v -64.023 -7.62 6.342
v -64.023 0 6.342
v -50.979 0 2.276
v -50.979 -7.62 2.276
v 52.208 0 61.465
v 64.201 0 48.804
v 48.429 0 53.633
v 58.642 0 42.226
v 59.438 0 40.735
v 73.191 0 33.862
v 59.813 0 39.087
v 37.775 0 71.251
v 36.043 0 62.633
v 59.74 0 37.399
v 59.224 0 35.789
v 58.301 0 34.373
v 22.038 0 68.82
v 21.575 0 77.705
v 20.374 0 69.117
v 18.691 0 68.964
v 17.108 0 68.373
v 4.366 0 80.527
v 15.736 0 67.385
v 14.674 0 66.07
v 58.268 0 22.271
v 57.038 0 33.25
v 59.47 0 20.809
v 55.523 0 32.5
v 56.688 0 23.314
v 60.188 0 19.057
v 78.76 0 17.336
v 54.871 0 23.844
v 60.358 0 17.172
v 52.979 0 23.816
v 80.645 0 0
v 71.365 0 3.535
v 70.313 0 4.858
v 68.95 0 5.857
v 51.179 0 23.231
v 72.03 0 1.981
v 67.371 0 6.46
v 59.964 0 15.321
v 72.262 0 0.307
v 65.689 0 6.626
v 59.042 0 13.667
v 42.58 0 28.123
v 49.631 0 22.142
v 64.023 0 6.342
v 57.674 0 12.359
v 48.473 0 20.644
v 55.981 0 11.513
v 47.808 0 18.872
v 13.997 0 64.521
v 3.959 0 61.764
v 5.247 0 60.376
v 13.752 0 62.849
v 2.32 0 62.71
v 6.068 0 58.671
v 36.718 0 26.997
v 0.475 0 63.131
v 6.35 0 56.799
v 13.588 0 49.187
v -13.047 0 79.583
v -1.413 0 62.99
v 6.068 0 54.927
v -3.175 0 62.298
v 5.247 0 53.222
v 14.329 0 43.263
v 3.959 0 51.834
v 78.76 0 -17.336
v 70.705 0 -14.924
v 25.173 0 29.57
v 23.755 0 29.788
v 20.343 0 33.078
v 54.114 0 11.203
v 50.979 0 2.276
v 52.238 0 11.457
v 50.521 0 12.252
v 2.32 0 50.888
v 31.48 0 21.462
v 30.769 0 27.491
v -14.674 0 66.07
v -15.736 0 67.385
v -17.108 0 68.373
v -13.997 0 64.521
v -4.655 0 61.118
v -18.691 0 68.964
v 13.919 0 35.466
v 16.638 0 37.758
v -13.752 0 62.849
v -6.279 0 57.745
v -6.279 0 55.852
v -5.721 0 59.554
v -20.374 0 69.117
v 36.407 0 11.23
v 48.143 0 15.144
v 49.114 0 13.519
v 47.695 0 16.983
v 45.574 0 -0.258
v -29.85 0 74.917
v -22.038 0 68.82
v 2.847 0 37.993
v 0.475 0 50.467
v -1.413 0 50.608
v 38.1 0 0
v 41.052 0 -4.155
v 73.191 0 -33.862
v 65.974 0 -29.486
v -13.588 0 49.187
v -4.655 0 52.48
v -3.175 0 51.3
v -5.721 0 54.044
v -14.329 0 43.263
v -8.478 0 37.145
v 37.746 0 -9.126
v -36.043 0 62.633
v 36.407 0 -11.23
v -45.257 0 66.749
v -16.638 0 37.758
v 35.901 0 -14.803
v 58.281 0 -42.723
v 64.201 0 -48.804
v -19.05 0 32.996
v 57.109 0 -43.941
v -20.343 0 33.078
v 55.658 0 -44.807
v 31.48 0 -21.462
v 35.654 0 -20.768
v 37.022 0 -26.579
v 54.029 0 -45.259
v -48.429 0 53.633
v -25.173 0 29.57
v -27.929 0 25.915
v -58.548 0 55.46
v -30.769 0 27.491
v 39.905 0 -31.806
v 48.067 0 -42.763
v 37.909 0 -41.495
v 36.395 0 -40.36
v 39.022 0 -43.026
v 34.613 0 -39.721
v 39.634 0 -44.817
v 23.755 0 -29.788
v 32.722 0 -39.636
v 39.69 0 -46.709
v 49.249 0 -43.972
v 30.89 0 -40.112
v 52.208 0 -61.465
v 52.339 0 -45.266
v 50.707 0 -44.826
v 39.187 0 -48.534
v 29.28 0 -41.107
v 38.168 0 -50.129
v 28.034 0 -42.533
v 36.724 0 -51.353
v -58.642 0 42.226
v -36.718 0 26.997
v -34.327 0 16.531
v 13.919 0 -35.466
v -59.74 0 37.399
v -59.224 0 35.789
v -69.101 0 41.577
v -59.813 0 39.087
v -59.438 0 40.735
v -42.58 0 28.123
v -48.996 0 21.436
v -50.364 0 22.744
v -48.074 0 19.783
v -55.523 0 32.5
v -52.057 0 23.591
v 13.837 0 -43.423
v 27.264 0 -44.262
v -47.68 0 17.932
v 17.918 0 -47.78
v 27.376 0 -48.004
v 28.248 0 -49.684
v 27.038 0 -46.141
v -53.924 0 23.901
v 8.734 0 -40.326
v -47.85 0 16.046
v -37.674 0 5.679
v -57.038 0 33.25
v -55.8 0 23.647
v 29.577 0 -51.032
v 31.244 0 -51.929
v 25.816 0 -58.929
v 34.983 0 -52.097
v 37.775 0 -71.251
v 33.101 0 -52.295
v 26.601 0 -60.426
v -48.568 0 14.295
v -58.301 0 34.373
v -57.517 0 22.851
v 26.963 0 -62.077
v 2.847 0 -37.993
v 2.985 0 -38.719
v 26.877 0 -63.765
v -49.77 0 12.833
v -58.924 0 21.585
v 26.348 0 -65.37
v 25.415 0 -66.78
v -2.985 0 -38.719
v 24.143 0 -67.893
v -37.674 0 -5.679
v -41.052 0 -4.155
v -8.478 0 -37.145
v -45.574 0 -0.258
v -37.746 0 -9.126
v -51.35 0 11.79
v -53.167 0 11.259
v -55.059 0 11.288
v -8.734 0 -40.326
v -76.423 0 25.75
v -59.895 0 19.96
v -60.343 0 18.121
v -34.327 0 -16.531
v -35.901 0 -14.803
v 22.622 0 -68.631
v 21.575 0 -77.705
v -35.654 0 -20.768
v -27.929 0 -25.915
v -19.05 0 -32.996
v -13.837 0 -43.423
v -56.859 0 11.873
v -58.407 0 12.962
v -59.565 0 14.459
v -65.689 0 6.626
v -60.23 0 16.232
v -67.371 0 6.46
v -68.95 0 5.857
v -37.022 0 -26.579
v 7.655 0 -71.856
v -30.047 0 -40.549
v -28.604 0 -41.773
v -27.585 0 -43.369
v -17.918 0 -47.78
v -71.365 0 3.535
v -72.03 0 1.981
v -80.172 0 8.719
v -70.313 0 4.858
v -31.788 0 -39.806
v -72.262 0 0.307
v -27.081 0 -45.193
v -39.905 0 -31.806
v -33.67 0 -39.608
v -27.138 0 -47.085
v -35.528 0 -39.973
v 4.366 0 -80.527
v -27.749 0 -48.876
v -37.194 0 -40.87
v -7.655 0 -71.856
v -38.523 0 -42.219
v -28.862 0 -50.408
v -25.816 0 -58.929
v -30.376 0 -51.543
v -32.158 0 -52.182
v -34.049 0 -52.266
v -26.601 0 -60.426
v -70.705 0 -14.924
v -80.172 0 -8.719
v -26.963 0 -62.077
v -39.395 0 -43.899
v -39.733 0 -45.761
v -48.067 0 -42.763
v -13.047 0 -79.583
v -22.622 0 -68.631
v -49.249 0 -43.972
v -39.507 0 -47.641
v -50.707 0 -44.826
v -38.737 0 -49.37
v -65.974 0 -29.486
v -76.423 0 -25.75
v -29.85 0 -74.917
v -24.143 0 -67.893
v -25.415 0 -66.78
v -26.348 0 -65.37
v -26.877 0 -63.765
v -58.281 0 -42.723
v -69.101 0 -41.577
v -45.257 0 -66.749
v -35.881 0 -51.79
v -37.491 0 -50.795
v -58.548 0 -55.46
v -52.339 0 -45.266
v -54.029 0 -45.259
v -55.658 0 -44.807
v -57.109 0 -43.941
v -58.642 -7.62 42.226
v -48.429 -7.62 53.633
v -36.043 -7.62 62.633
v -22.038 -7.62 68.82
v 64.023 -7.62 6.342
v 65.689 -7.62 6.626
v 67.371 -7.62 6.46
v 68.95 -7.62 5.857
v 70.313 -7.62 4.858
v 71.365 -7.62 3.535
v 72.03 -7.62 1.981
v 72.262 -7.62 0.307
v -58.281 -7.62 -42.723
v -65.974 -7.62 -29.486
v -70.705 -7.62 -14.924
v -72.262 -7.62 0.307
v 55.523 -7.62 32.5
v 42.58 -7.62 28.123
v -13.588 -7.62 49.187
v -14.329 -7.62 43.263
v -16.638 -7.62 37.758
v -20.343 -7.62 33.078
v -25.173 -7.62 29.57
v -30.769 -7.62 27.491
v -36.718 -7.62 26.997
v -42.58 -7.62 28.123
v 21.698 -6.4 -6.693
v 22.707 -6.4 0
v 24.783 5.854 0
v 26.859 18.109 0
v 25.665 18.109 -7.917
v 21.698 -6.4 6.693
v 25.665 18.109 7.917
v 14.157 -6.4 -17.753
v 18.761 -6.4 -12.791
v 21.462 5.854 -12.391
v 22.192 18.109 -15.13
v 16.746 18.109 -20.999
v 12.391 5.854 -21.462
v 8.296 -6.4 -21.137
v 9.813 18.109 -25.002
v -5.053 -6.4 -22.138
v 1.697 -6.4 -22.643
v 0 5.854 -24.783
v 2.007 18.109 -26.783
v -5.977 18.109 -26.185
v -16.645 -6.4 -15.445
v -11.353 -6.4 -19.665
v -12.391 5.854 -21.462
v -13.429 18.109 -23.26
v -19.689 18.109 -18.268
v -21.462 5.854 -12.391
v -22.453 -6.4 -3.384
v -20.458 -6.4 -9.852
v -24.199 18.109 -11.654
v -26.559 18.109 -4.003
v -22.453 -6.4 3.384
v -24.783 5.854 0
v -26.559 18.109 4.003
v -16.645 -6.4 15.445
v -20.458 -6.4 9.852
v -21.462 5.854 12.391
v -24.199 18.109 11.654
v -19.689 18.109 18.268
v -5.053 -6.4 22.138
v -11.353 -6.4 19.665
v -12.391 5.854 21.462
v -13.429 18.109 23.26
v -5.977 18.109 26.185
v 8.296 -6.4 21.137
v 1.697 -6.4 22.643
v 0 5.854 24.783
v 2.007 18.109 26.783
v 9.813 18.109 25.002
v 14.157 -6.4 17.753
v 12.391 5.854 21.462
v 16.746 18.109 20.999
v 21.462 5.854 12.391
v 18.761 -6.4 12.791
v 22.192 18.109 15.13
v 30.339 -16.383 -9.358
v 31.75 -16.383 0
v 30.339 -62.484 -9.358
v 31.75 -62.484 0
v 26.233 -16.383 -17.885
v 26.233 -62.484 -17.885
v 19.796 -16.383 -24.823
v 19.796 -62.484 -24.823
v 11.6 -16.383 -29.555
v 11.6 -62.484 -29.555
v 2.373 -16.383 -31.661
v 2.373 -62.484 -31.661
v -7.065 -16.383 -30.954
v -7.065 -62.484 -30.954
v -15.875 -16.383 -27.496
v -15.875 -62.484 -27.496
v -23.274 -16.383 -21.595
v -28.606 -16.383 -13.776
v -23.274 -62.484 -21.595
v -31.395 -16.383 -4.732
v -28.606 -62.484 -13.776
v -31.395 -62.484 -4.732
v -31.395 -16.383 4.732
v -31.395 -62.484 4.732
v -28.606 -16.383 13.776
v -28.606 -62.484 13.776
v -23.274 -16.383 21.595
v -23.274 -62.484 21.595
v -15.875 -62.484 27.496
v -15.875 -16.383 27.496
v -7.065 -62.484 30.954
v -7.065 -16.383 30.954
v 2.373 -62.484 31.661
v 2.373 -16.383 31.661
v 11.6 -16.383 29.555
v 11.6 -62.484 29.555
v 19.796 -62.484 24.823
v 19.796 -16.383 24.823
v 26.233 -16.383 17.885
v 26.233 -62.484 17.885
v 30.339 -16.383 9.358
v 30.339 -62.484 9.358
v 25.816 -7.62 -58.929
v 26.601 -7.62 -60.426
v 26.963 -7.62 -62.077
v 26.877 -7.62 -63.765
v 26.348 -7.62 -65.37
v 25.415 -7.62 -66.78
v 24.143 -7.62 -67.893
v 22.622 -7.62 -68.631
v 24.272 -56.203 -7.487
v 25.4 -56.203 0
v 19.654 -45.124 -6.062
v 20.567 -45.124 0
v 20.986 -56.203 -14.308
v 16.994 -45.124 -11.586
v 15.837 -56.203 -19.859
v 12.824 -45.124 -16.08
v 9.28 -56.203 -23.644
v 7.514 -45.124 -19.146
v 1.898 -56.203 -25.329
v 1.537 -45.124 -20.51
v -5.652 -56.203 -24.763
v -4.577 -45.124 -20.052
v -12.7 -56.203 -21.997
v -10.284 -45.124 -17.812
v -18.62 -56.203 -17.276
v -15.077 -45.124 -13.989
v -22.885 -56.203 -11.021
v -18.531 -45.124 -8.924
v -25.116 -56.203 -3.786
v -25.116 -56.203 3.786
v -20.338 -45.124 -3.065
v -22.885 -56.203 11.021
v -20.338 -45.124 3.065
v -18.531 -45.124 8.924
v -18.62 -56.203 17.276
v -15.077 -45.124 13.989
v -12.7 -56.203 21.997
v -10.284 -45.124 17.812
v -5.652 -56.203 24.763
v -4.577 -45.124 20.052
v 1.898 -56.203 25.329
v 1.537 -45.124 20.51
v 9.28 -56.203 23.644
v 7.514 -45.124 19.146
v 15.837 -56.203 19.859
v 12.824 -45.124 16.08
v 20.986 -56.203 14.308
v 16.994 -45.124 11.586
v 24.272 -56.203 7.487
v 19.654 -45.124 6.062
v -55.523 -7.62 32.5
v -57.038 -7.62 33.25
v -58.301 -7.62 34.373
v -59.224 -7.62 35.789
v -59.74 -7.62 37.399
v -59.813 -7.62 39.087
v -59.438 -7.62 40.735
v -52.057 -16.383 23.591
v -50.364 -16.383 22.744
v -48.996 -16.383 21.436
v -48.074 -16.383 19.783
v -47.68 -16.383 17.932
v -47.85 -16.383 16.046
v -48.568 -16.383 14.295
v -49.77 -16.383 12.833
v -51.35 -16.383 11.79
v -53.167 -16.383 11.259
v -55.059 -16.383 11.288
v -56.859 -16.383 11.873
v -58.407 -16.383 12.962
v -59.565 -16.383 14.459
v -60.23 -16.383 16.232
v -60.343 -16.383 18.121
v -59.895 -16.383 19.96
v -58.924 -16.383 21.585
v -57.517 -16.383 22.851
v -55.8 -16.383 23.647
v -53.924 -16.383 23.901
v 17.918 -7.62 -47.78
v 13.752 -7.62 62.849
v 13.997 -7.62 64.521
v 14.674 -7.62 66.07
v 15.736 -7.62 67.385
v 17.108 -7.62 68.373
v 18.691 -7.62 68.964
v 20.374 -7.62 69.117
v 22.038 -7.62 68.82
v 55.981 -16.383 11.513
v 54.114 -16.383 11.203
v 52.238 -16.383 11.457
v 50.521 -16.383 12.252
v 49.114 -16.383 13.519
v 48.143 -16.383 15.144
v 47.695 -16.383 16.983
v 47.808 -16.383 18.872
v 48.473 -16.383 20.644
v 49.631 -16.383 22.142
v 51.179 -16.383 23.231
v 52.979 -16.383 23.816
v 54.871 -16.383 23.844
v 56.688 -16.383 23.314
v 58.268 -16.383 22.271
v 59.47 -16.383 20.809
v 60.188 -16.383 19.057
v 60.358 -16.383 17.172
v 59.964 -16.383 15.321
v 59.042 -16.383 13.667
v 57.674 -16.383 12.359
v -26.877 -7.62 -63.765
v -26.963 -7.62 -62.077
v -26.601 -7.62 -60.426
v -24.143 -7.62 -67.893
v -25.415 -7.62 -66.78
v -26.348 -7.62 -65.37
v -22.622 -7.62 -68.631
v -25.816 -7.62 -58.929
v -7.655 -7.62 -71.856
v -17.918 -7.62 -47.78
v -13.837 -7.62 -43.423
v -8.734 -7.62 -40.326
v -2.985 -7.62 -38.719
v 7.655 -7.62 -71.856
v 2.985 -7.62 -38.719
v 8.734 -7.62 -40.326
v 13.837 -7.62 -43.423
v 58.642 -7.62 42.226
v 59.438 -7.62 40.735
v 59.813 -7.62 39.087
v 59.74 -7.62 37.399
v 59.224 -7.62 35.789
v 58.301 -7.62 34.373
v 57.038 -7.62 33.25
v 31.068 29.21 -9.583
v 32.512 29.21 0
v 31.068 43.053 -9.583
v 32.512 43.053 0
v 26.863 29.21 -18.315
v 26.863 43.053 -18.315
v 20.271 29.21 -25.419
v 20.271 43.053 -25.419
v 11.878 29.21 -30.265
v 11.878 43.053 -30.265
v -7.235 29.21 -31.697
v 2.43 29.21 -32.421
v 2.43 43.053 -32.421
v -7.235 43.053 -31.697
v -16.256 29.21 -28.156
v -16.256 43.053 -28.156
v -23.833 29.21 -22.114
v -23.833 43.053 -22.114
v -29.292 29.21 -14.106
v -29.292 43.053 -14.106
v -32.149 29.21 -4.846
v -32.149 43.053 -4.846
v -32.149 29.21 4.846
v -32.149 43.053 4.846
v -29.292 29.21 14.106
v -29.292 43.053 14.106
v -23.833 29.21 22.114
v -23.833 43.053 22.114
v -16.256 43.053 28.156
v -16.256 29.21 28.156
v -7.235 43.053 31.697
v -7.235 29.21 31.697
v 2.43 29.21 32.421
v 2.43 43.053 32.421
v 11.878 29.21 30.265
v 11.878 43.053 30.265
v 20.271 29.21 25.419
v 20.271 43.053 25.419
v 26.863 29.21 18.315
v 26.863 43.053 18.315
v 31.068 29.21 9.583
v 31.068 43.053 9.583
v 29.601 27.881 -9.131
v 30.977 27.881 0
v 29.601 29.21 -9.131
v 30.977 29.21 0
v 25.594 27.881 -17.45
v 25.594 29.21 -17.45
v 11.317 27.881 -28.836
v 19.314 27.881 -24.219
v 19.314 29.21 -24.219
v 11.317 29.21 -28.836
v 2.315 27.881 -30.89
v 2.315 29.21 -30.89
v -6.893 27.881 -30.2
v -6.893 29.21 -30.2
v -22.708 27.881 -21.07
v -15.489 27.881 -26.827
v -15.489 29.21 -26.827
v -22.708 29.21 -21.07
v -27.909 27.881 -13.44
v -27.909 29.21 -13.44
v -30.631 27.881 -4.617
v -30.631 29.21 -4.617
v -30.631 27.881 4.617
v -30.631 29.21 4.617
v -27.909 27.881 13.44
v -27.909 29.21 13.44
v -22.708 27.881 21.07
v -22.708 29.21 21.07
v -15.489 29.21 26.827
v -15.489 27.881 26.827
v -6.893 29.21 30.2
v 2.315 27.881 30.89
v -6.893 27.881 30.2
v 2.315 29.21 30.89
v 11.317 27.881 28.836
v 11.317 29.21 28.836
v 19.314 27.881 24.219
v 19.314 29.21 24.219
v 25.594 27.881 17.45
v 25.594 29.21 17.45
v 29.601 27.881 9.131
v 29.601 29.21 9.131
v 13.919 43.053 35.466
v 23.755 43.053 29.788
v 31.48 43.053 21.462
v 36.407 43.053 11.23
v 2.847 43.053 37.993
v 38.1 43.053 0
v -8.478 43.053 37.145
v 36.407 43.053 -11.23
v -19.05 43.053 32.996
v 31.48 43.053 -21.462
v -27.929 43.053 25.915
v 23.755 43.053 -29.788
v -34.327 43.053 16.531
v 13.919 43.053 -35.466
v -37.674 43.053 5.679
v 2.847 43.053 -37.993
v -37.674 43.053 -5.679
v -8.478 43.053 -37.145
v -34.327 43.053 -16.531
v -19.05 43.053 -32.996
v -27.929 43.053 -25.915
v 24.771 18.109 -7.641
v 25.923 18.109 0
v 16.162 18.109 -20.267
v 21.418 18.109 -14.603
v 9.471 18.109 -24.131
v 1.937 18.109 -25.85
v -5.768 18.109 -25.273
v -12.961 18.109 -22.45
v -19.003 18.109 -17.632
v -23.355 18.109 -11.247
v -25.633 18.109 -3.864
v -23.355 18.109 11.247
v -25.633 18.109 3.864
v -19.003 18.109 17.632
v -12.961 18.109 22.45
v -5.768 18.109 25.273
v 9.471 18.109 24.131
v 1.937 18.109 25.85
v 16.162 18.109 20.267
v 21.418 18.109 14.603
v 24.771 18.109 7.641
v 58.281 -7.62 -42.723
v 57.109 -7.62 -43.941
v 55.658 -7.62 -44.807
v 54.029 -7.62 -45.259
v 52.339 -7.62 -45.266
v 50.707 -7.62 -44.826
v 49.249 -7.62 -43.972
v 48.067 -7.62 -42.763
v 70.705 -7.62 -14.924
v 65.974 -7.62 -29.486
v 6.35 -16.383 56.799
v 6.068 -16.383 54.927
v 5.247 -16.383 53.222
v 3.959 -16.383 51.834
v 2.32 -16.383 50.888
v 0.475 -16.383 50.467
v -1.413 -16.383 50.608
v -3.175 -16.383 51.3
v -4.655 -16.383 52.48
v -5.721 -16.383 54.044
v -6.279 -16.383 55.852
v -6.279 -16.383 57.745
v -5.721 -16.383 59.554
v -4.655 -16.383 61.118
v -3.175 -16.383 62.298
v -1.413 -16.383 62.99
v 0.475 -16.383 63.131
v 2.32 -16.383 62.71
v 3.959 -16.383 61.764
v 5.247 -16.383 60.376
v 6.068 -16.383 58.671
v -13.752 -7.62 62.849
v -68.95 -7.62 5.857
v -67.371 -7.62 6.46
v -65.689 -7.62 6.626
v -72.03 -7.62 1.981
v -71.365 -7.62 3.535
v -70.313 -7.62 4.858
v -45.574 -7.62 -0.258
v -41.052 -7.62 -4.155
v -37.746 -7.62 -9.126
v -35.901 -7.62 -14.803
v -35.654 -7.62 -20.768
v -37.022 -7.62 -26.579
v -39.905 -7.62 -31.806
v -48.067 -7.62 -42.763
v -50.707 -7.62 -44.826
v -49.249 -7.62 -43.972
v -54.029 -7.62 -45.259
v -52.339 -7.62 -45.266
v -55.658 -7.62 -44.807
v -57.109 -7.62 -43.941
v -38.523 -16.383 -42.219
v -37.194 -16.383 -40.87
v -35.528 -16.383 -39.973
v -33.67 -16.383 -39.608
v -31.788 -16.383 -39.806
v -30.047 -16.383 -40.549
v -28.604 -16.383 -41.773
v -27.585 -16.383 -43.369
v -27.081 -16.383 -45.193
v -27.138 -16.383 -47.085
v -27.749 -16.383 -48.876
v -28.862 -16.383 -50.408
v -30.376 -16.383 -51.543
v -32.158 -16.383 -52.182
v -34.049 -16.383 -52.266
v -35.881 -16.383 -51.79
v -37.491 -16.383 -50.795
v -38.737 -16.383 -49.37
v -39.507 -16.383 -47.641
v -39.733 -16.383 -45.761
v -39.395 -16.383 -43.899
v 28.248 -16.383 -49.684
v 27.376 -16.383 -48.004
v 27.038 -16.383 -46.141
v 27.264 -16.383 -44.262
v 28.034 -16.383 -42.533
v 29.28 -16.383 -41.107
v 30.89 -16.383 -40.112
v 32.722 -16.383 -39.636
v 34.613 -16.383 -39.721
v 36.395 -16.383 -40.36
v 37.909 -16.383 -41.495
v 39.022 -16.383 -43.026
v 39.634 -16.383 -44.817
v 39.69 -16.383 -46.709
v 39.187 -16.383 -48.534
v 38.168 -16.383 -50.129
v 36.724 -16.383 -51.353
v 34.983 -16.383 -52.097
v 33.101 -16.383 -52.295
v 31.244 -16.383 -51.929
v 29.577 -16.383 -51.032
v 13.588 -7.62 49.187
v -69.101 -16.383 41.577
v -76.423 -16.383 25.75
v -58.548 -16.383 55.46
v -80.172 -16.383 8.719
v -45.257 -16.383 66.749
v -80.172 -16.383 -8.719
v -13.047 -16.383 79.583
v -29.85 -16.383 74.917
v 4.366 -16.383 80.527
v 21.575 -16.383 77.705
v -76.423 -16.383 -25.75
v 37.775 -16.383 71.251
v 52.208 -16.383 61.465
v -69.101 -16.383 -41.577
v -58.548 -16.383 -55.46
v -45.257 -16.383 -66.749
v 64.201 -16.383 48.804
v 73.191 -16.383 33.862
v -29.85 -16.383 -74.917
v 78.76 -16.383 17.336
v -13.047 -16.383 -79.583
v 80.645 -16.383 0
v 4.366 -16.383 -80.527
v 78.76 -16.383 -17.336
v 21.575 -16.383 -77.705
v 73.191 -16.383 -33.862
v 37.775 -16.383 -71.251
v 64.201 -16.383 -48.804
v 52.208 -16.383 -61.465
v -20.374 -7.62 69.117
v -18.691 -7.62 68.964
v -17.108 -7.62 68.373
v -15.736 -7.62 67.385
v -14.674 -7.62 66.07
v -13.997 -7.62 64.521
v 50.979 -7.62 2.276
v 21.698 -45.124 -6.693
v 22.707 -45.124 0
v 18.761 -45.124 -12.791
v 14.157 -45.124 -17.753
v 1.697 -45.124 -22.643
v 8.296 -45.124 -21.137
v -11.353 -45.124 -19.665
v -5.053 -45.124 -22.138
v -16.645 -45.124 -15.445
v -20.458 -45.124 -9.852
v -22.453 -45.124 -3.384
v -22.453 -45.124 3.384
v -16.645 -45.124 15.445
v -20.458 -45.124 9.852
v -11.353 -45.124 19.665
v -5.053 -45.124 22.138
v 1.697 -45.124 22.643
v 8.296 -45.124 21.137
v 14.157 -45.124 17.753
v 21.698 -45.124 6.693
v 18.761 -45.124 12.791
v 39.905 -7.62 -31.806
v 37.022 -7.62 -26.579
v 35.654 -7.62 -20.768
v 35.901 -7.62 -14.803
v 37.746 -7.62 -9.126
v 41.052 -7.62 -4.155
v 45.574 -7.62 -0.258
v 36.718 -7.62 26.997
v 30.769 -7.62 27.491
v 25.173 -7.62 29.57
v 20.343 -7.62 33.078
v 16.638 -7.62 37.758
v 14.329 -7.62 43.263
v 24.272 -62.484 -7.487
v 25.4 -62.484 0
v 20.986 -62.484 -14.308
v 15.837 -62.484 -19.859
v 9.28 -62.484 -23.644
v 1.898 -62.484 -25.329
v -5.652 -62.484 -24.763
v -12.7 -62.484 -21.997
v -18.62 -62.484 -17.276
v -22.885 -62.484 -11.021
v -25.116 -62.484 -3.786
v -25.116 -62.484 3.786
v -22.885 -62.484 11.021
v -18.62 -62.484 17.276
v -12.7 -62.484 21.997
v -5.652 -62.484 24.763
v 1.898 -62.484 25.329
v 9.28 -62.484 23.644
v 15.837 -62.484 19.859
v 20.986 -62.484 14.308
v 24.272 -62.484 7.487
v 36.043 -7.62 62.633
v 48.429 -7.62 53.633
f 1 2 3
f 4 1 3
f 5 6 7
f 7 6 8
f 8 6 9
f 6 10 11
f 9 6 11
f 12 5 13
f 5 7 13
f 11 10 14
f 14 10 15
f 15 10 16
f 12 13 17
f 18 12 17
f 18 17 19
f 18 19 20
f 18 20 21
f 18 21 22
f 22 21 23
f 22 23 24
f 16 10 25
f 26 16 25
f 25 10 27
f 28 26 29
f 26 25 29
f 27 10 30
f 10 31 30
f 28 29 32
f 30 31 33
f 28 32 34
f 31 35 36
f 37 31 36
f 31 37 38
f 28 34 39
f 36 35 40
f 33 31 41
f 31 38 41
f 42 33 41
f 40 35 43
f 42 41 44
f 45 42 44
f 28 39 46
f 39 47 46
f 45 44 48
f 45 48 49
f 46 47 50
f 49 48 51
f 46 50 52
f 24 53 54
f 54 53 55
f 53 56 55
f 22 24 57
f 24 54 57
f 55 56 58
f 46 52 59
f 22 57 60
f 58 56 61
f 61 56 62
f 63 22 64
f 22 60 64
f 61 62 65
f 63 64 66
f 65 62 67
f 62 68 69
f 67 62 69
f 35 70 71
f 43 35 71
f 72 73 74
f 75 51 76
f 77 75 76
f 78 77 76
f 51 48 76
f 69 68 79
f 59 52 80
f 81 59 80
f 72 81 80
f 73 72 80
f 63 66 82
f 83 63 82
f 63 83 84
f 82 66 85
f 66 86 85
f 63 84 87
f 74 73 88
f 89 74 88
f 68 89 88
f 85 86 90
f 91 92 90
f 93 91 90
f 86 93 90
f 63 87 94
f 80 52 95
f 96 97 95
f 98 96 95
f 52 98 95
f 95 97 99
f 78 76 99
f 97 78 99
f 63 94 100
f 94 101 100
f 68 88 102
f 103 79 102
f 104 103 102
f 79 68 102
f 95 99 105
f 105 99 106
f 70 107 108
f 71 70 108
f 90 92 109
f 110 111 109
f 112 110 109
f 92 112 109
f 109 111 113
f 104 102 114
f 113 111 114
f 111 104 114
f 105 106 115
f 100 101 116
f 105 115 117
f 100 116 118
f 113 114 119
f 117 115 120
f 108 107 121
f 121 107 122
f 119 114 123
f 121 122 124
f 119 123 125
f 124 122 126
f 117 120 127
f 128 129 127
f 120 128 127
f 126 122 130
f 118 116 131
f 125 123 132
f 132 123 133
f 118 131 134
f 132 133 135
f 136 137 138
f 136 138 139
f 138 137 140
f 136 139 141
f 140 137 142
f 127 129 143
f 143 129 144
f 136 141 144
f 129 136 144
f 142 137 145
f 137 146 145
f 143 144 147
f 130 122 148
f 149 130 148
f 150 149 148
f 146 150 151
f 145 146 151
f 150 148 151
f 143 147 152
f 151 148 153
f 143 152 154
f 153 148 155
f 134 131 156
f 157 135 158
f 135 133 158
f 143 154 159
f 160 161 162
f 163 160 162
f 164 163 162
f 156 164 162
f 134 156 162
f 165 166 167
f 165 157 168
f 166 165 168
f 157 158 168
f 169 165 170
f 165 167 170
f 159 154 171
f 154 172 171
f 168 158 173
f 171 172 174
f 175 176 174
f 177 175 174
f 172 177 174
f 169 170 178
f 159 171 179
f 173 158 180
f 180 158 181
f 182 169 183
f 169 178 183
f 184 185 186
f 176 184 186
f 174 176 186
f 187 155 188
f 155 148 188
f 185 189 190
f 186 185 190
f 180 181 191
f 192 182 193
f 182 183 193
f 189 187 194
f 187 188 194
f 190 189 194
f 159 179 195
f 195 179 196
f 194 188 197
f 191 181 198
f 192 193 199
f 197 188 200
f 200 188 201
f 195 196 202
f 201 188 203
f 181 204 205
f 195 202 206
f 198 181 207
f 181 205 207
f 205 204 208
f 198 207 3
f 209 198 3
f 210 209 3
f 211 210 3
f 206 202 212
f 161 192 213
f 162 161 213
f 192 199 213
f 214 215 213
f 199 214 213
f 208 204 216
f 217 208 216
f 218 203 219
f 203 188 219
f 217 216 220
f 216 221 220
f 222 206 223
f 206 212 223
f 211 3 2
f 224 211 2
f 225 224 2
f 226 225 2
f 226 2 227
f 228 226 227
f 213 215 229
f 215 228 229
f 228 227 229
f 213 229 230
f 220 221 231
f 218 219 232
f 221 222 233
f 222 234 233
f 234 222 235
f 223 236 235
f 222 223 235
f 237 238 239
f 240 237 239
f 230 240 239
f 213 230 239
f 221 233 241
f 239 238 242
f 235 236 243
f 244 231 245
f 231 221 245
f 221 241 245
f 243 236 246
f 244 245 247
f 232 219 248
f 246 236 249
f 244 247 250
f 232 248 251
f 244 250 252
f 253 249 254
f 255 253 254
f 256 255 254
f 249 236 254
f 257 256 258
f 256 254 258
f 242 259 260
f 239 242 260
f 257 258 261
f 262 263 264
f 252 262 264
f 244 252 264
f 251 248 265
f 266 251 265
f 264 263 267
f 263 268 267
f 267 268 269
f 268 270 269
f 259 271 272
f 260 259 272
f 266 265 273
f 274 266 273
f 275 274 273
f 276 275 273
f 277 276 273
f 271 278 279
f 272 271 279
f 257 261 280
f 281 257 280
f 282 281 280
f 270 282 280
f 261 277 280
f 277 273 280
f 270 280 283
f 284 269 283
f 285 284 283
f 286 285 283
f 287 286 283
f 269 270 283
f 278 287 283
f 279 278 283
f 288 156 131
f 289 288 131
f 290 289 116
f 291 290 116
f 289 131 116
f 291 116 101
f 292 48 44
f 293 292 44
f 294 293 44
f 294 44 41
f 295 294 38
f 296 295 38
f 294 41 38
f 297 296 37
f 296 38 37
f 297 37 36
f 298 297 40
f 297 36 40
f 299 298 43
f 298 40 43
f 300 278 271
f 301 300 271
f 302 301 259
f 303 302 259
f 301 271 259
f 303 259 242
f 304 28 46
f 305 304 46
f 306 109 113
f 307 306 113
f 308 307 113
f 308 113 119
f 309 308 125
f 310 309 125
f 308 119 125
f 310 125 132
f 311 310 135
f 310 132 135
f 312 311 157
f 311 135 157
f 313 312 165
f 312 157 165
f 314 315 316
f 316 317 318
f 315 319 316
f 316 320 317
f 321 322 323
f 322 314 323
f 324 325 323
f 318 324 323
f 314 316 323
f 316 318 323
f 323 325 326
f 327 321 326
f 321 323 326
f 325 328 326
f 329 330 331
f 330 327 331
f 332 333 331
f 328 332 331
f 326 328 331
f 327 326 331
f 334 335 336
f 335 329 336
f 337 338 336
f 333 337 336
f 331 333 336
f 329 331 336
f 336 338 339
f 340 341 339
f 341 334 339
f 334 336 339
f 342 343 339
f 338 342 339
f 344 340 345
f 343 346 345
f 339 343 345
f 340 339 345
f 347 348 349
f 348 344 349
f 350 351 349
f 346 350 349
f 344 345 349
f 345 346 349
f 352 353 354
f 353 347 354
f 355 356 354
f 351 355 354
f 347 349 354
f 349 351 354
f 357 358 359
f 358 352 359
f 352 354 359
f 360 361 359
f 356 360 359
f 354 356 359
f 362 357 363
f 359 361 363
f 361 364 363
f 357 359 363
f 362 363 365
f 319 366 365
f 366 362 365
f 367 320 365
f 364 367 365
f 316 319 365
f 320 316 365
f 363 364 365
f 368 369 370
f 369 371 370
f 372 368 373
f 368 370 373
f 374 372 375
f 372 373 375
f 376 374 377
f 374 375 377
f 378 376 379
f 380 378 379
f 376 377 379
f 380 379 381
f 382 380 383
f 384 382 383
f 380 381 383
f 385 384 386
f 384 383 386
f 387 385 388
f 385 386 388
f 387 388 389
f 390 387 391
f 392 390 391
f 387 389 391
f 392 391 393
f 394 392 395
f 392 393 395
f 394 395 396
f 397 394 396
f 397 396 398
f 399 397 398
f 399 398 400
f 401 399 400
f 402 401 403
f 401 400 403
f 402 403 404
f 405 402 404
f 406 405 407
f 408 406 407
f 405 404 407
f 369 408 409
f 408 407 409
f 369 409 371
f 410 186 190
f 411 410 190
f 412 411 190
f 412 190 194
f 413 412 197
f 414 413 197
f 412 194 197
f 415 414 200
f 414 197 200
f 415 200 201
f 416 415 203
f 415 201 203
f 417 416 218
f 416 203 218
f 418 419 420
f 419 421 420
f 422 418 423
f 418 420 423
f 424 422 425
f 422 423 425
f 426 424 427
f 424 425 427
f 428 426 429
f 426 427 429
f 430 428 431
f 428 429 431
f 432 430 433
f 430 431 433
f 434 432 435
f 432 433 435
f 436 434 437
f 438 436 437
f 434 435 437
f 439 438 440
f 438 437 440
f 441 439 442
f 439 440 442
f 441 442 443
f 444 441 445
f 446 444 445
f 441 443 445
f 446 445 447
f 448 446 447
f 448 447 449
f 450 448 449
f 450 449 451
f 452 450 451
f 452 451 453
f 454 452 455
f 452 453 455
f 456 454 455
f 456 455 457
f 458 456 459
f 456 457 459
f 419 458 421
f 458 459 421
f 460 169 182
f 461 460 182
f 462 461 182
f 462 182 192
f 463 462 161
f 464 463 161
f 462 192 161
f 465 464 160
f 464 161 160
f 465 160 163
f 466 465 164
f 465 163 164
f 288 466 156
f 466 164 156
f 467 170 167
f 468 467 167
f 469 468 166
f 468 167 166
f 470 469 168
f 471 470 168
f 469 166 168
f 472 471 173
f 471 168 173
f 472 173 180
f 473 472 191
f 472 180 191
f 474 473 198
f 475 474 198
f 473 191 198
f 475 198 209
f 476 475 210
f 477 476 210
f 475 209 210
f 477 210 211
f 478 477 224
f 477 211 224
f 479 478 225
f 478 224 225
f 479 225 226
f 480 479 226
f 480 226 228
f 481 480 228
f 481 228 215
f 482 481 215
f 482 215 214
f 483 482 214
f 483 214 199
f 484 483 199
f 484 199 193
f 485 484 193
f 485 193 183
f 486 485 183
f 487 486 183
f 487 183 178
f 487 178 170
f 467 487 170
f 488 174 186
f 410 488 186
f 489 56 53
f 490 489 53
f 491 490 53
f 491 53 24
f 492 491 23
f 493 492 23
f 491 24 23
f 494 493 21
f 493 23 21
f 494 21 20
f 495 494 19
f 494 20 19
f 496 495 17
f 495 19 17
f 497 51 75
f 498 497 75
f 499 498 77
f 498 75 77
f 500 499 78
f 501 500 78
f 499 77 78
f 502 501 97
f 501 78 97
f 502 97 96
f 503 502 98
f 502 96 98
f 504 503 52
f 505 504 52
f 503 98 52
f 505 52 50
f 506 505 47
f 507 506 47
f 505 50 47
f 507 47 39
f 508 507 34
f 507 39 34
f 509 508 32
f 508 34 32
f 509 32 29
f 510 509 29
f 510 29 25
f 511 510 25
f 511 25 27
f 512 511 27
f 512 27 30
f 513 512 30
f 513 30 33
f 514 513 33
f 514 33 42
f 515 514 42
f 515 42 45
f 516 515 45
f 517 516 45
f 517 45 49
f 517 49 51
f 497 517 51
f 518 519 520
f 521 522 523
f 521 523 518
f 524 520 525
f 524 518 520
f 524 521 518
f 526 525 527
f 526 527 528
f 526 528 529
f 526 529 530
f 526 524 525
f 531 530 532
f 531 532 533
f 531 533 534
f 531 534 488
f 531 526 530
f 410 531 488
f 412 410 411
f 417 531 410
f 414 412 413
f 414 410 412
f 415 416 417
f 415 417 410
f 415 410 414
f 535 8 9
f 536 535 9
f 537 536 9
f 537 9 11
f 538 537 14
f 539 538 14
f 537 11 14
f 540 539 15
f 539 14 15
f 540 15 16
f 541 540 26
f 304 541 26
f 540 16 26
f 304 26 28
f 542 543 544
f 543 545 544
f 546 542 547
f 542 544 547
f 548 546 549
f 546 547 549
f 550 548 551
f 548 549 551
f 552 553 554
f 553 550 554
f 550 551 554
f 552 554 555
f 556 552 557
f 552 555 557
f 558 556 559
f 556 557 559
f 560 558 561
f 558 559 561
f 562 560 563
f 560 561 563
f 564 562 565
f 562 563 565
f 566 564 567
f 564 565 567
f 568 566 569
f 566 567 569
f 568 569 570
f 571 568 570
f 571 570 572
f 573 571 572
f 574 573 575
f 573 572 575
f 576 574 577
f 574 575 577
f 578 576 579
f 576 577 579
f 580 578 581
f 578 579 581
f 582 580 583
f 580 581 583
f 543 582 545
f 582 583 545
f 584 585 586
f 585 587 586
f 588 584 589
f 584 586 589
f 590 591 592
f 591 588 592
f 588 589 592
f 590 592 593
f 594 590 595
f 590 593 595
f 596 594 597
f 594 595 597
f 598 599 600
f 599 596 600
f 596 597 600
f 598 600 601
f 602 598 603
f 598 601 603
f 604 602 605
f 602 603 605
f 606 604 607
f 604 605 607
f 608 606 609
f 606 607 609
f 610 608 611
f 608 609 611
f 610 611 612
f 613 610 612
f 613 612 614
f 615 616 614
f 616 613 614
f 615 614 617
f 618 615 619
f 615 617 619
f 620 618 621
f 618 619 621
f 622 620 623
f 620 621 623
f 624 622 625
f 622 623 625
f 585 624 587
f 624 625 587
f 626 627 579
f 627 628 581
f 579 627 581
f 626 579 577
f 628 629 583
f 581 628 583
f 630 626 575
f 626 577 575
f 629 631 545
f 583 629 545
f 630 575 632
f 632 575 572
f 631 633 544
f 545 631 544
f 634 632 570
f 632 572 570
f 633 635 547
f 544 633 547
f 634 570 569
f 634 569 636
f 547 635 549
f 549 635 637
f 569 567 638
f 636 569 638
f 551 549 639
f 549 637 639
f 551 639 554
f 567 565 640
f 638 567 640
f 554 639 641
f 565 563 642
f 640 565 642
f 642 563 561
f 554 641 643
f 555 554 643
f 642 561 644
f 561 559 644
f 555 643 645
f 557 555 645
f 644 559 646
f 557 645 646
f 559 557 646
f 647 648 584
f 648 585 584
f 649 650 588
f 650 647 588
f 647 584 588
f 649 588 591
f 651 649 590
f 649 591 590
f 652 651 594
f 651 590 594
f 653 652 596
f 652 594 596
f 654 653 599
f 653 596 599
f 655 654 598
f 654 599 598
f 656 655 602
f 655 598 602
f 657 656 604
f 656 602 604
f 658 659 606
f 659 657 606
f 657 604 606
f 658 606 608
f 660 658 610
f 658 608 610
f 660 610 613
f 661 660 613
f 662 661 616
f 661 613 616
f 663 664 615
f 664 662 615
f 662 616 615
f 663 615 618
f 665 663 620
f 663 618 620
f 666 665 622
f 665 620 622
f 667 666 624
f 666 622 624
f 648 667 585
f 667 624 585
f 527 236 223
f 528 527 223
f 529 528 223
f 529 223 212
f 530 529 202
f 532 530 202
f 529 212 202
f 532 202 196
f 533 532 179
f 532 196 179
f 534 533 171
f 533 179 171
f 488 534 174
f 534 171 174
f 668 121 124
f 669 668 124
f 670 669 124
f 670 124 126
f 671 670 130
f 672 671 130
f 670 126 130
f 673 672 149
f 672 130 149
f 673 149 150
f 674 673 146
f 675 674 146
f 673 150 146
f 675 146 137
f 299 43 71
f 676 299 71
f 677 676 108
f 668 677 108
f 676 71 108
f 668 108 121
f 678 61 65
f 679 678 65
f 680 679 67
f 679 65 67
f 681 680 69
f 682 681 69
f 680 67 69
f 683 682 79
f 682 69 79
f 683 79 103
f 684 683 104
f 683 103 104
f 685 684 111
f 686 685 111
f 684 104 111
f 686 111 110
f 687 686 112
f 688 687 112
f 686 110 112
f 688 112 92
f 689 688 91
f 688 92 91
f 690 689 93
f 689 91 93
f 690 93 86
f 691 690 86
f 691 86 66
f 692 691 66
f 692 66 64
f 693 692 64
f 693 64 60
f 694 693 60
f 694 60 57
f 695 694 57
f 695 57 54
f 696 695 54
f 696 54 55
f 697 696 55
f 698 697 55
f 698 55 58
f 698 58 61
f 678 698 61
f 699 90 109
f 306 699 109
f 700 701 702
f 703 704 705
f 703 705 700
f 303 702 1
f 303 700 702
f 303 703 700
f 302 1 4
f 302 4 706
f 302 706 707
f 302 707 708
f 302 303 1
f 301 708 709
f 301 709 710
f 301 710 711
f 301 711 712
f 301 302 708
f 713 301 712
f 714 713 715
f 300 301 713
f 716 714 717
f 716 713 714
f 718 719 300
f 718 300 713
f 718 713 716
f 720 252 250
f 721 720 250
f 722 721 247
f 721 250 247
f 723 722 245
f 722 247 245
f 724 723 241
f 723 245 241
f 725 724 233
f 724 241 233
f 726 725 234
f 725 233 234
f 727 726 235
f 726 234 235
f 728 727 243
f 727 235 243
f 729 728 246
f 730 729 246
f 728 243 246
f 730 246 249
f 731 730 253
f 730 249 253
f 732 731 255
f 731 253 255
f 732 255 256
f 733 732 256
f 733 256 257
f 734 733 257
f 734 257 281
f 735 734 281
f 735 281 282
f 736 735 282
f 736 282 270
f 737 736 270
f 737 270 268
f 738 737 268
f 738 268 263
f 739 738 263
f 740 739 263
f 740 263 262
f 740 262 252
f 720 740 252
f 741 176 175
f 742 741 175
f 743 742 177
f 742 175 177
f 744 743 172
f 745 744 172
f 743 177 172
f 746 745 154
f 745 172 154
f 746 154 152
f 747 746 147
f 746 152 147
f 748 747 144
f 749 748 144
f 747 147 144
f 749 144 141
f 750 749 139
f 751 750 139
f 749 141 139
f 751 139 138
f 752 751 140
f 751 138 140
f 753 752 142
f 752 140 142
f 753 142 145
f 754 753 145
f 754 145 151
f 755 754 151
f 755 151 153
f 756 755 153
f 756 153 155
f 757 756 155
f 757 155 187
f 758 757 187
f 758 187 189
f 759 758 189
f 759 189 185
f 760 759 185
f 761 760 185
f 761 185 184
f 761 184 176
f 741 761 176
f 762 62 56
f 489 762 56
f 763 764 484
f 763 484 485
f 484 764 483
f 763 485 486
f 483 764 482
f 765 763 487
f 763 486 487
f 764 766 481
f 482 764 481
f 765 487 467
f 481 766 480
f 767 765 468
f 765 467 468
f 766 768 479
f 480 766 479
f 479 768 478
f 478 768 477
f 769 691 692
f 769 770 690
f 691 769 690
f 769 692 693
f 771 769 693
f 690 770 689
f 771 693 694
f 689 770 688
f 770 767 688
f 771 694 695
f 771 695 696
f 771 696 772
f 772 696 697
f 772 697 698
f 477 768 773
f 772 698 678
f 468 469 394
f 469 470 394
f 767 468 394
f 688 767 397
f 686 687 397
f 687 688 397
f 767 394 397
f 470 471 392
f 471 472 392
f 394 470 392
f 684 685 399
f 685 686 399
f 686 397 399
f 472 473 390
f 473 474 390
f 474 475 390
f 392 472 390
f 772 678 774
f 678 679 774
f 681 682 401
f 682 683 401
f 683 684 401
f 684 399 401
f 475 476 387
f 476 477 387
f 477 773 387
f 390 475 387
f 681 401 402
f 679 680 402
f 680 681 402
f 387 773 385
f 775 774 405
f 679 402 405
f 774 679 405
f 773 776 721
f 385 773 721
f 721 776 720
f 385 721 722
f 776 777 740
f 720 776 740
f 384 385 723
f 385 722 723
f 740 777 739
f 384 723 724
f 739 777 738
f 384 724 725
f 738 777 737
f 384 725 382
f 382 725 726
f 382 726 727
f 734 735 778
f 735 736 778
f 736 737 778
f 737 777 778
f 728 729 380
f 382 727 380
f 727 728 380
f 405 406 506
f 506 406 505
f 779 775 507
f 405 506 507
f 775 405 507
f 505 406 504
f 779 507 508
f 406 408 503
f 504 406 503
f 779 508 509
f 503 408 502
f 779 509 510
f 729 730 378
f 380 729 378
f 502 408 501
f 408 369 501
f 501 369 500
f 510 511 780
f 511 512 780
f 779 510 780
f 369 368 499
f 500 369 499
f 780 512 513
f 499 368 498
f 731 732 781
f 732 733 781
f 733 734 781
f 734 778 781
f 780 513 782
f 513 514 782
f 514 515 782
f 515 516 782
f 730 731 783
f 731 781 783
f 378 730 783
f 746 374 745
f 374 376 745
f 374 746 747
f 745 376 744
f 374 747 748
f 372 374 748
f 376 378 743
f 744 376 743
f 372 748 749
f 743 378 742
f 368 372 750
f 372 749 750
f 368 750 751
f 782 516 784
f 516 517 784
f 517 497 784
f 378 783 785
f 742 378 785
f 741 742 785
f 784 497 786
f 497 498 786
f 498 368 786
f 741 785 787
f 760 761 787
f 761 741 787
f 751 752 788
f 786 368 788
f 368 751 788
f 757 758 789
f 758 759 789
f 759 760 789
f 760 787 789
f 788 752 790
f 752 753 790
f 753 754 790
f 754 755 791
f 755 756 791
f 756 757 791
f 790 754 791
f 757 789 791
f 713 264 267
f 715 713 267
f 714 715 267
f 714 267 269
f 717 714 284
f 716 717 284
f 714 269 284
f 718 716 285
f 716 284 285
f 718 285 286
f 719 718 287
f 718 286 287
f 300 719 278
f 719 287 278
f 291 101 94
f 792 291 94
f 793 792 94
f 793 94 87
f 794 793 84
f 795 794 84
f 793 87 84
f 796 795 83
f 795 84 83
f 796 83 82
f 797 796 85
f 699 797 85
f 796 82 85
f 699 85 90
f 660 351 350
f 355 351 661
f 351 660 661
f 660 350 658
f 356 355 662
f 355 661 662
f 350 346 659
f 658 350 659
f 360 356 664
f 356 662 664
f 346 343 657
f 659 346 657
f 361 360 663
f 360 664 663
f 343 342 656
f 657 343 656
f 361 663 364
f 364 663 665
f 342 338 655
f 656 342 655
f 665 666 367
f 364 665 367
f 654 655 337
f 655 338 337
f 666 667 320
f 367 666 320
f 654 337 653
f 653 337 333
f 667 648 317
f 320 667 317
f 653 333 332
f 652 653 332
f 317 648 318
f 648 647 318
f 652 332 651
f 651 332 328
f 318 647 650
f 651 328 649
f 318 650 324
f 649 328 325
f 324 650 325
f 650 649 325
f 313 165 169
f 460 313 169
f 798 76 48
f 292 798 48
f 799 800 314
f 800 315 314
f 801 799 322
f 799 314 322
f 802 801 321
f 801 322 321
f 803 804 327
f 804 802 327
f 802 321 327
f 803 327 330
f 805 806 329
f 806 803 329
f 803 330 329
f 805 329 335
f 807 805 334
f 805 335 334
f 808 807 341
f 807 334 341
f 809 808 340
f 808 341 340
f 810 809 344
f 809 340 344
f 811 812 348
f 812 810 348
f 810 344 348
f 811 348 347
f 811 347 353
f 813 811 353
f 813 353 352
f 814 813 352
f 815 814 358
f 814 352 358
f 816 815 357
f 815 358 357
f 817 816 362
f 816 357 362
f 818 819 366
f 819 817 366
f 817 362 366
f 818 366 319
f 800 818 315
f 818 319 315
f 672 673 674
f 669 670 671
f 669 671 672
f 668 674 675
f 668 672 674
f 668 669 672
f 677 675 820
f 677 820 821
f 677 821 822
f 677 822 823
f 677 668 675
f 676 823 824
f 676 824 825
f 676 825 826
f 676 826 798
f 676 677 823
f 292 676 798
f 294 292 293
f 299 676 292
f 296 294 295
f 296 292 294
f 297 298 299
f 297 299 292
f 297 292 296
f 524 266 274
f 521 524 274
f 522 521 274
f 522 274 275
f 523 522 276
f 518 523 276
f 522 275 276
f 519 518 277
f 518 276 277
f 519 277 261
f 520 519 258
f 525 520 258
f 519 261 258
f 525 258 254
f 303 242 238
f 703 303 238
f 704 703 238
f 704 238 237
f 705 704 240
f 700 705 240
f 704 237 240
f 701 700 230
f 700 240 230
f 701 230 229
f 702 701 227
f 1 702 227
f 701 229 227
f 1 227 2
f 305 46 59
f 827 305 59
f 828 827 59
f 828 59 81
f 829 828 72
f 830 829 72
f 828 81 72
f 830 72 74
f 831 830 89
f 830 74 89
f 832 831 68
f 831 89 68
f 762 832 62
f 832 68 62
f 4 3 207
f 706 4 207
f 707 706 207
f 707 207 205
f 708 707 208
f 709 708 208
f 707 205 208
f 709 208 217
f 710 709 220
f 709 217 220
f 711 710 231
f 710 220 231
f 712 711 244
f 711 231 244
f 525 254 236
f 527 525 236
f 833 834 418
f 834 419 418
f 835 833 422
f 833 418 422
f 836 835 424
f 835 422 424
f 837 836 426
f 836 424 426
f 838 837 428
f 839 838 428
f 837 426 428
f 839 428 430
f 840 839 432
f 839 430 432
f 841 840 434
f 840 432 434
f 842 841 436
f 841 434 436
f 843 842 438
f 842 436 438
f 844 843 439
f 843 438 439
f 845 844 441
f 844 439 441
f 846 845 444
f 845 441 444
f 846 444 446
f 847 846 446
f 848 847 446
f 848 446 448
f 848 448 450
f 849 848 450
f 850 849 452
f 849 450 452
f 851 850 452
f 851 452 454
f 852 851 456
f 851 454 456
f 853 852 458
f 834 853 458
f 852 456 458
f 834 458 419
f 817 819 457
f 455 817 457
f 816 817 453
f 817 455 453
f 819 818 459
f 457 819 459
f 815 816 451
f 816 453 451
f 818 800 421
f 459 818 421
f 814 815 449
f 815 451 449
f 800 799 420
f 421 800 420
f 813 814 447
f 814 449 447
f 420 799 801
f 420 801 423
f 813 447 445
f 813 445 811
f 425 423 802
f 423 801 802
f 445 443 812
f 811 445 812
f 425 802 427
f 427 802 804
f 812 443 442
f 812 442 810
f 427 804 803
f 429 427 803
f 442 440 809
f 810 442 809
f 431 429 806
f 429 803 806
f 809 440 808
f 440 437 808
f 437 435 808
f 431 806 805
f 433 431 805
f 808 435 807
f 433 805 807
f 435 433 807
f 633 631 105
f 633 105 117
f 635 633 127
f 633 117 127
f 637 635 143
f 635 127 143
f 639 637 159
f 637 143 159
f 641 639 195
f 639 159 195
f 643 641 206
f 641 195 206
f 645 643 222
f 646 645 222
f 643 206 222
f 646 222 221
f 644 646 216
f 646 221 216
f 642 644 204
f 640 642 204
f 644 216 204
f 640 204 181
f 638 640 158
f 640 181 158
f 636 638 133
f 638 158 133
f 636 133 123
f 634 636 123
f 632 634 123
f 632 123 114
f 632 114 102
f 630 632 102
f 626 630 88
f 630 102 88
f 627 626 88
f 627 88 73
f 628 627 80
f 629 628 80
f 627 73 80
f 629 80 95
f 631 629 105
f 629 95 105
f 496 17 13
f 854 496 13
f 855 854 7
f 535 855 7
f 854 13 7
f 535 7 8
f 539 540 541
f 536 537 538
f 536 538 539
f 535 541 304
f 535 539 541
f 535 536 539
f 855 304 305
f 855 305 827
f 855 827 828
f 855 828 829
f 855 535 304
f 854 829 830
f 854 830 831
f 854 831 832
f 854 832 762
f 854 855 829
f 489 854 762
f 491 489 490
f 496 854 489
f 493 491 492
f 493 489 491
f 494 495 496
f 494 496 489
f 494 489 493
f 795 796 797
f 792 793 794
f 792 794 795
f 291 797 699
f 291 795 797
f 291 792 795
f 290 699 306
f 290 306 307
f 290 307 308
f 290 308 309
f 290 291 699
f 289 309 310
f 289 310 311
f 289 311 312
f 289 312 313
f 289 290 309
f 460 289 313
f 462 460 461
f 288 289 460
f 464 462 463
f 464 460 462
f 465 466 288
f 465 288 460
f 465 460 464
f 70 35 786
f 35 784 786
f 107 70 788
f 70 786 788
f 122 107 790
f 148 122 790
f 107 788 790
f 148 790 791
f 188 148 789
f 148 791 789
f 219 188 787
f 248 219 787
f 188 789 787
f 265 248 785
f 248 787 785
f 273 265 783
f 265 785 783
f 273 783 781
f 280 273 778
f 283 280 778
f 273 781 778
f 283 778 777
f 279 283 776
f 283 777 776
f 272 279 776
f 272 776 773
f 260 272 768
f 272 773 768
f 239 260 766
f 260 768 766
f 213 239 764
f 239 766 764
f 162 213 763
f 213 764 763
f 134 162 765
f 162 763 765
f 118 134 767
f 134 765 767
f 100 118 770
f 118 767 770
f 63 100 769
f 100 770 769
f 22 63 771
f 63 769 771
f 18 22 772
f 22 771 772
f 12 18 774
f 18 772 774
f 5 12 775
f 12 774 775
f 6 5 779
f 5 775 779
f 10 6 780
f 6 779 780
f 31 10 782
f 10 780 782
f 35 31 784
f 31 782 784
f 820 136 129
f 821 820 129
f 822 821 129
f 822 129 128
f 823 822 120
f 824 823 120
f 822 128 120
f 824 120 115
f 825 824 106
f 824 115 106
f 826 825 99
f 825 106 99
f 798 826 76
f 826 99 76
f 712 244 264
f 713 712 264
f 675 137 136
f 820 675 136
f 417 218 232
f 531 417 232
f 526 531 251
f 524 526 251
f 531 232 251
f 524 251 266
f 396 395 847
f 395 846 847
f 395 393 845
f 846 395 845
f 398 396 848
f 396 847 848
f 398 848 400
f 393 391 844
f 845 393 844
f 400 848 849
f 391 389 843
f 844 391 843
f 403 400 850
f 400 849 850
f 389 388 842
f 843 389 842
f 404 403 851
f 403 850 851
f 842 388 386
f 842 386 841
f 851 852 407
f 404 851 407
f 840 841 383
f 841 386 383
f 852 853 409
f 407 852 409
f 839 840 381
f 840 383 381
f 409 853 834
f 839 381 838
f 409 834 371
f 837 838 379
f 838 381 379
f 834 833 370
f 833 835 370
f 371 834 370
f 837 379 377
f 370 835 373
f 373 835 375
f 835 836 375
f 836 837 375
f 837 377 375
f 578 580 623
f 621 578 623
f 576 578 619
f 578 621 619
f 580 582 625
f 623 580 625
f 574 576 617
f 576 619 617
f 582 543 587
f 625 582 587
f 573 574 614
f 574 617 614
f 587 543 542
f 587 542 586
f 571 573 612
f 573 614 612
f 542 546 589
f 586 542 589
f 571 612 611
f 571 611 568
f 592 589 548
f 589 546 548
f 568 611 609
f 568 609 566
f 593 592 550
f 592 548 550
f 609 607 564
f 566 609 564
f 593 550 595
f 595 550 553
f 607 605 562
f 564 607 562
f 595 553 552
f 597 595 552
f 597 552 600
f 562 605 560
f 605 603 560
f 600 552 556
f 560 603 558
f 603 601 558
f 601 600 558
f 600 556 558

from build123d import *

# Parameters (mm, degrees)
SKETCH2_R          = 6.35
CUT_EXTRUDE1_DEPTH = 131.044155217
CIRPATTERN1_COUNT  = 5
CUT_EXTRUDE2_DEPTH = 7.62
CIRPATTERN2_COUNT  = 5


with BuildPart() as part:
    # Sketch1 → Revolve1 (revolve)
    with BuildSketch(Plane.XY):
        Polygon((32.512, 43.053), (38.1, 43.053), (38.1, 0), (80.645, 0), (80.645, -16.383), (31.75, -16.383), (31.75, -62.484), (25.4, -62.484), (25.4, -56.202878337), (20.567388856, -45.123813585), (22.706839799, -45.123813585), (22.706839799, -6.400010137), (26.858598141, 18.108781172), (25.922560718, 18.108781172), (30.977038212, 27.881202719), (30.977038212, 29.21), (32.512, 29.21), align=None)
    revolve(axis=Axis((0, 66.608222053, 0), (0, -1, 0)))

    # Sketch2 → Cut-Extrude1 (cut, through all)
    with BuildSketch(Plane(origin=(0, 0, 0), x_dir=(1, 0, 0), z_dir=(0, 1, 0))):
        with Locations((0, -56.798909535)):
            Circle(SKETCH2_R)
    cut_extrude1 = extrude(amount=-CUT_EXTRUDE1_DEPTH, mode=Mode.SUBTRACT)

    # CirPattern1: Cut-Extrude1 ×5 about axis
    cirpattern1_axis = Axis((0, 48.32985, 0), (0, -1, 0))
    for i in range(1, CIRPATTERN1_COUNT):
        add(cut_extrude1.rotate(cirpattern1_axis, i * 360 / CIRPATTERN1_COUNT), mode=Mode.SUBTRACT)

    # Sketch3 → Cut-Extrude2 (cut)
    with BuildSketch(Plane(origin=(0, 0, 0), x_dir=(1, 0, 0), z_dir=(0, 1, 0))):
        with BuildLine():
            Line((-25.816115671, 58.929202602), (-17.918089551, 47.780088903))
            ThreePointArc((-17.918089551, 47.780088903), (0, 38.514784655), (17.918089551, 47.780088903))
            Line((17.918089551, 47.780088903), (25.816115671, 58.929202602))
            ThreePointArc((25.816115671, 58.929202602), (26.666104709, 64.585415867), (22.622433381, 68.630654062))
            ThreePointArc((22.622433381, 68.630654062), (0, 72.263), (-22.622433381, 68.630654062))
            ThreePointArc((-22.622433381, 68.630654062), (-26.666104709, 64.585415867), (-25.816115671, 58.929202602))
        make_face()
    cut_extrude2 = extrude(amount=-CUT_EXTRUDE2_DEPTH, mode=Mode.SUBTRACT)

    # CirPattern2: Cut-Extrude2 ×5 about axis
    cirpattern2_axis = Axis((0, 48.32985, 0), (0, -1, 0))
    for i in range(1, CIRPATTERN2_COUNT):
        add(cut_extrude2.rotate(cirpattern2_axis, i * 360 / CIRPATTERN2_COUNT), mode=Mode.SUBTRACT)


solid = part.part
